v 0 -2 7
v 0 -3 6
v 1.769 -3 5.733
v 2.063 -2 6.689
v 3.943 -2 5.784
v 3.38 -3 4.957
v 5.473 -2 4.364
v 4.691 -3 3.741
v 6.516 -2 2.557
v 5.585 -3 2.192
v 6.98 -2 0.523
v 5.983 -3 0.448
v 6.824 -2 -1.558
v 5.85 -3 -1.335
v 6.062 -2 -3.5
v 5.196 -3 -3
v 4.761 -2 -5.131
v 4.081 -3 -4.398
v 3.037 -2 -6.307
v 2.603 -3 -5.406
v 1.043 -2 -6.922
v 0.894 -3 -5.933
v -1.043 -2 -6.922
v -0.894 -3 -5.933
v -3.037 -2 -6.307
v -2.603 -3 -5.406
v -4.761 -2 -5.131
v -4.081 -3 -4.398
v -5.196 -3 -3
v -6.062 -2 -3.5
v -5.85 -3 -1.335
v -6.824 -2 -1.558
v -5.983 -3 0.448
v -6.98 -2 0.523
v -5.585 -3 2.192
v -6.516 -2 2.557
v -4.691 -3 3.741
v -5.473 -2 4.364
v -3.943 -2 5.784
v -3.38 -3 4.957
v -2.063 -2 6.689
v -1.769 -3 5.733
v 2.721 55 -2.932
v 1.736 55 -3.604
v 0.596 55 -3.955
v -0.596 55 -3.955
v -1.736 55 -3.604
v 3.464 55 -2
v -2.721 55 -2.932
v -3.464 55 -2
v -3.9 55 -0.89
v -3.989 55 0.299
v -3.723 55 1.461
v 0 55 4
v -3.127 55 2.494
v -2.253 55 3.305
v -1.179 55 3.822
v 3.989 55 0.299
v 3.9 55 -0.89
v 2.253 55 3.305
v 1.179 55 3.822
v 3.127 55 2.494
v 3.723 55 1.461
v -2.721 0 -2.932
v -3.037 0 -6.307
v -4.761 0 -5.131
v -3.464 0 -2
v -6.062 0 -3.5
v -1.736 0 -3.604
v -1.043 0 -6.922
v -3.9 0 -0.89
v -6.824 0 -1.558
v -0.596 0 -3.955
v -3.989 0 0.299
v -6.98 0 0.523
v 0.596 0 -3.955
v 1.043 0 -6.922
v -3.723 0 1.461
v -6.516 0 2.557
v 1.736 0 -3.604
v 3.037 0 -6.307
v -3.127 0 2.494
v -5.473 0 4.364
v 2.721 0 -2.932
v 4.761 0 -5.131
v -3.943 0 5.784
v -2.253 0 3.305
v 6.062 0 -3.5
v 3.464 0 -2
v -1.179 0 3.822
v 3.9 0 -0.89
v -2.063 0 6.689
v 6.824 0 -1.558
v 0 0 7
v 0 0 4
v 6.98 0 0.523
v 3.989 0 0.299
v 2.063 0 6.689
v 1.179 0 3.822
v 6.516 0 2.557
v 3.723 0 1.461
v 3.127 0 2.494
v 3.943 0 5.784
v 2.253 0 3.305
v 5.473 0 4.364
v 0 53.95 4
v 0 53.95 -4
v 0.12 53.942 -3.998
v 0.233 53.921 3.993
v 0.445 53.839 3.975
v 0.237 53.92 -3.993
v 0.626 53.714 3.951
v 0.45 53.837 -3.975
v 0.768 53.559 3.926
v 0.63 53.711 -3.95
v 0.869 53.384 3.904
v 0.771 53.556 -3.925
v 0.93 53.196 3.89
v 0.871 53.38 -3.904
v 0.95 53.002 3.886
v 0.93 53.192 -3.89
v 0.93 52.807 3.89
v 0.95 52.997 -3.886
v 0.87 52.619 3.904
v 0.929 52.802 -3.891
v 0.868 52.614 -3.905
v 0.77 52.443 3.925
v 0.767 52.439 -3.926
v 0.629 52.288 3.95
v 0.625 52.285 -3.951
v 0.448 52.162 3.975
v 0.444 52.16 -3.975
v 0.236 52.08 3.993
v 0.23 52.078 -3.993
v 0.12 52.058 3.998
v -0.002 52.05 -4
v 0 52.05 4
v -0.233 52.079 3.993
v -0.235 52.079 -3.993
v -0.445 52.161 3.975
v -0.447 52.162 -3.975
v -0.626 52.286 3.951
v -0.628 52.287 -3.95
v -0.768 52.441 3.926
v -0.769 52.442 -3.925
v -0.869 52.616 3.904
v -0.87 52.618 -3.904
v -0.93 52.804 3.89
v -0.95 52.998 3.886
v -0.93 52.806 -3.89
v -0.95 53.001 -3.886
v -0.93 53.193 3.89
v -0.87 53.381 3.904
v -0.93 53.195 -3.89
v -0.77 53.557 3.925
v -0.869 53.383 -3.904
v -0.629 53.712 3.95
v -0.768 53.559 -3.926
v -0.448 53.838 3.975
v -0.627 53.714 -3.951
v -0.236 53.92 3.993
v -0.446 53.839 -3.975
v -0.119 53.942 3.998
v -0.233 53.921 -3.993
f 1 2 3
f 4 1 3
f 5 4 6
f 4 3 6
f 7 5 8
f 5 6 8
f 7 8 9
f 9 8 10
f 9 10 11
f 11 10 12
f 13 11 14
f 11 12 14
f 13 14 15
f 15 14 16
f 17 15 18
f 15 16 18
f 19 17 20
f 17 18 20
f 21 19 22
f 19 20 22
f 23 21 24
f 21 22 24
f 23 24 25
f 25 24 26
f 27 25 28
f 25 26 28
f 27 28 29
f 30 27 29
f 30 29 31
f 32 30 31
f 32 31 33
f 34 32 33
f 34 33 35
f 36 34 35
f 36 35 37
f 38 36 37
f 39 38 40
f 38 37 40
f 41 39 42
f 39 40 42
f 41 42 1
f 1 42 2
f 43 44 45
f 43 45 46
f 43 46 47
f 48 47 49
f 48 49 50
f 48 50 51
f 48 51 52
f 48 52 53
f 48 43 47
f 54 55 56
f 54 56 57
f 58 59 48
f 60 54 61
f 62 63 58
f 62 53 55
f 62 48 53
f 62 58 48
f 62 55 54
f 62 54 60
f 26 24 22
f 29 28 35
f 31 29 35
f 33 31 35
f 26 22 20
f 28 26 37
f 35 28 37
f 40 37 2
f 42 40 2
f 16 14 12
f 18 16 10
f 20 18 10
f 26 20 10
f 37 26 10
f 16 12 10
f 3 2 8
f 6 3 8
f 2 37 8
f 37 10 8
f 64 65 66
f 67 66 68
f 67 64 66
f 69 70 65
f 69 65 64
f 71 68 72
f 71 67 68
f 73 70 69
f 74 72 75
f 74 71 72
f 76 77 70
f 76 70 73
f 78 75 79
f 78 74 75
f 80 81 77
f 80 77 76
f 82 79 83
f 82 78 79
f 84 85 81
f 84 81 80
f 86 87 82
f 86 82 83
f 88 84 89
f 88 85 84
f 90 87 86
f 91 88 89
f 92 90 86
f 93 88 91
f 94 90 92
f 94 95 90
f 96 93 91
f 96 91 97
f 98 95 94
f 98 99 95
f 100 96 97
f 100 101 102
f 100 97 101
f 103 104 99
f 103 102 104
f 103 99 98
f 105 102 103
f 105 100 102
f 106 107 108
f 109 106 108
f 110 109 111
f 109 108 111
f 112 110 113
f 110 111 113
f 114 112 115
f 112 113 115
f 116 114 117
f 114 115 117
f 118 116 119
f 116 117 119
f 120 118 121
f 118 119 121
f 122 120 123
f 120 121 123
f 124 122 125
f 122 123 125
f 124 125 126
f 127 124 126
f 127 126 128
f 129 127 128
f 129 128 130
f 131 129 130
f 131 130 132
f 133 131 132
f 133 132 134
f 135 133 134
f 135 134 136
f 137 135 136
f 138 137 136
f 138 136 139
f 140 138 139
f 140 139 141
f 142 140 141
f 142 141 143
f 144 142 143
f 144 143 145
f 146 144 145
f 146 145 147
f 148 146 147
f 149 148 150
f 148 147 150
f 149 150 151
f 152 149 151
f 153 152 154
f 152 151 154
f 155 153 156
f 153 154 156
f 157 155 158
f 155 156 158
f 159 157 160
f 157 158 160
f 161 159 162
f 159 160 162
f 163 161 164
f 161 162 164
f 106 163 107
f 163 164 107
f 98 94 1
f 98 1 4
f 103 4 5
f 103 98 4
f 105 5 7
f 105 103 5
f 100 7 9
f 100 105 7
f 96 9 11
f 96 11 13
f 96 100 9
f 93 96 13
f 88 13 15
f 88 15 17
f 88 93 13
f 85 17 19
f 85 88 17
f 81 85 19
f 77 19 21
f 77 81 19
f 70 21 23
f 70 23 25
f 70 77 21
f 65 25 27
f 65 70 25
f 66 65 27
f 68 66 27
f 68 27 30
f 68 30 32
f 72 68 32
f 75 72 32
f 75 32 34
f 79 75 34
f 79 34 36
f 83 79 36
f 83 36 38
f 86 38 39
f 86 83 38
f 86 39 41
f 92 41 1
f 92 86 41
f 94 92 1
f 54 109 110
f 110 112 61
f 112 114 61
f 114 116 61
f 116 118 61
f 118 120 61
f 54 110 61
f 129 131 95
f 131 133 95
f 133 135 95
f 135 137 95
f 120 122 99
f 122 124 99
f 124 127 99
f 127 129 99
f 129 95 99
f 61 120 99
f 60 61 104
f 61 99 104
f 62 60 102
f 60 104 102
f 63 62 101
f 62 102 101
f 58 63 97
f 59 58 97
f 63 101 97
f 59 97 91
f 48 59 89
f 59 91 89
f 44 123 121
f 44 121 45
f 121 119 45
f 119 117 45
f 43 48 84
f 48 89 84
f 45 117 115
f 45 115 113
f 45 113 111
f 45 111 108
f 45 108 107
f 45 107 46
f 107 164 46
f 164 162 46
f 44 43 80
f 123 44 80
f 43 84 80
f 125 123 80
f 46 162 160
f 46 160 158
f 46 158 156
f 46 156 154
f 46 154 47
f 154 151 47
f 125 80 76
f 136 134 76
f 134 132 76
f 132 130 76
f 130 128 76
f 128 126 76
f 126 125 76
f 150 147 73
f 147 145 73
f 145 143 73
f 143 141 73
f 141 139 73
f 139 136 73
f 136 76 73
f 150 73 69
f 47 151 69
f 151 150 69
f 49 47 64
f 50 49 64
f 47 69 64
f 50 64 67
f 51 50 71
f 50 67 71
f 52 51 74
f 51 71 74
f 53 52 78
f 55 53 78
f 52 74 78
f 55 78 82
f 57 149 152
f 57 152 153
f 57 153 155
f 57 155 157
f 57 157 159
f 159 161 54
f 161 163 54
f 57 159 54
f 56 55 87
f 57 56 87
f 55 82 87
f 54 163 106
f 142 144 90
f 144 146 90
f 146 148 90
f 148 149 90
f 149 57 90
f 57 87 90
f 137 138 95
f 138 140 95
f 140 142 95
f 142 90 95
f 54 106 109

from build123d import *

# Parameters (mm, degrees)
SKETCH1_R           = 7
BOSS_EXTRUDE1_DEPTH = 3
SKETCH1_3_R         = 4
BOSS_EXTRUDE2_DEPTH = 55
SKETCH2_R           = 0.95
CUT_EXTRUDE1_DEPTH  = 57.524331044
CHAMFER1_SIZE       = 1


with BuildPart() as part:
    # Sketch1 → Boss-Extrude1 (new body)
    with BuildSketch(Plane(origin=(0, 0, 0), x_dir=(1, 0, 0), z_dir=(0, 1, 0))):
        Circle(SKETCH1_R)
    extrude(amount=-BOSS_EXTRUDE1_DEPTH)

    # Sketch1<3> → Boss-Extrude2 (add)
    with BuildSketch(Plane(origin=(0, 0, 0), x_dir=(1, 0, 0), z_dir=(0, 1, 0))):
        Circle(SKETCH1_3_R)
    extrude(amount=BOSS_EXTRUDE2_DEPTH)

    # Sketch2 → Cut-Extrude1 (cut, through all)
    with BuildSketch(Plane(origin=(0, 0, -4), x_dir=(-1, 0, 0), z_dir=(0, 0, -1))):
        with Locations((0, 53)):
            Circle(SKETCH2_R)
    extrude(amount=-CUT_EXTRUDE1_DEPTH, mode=Mode.SUBTRACT)

    # Chamfer1
    chamfer1_edges = [part.edges().sort_by_distance(p)[0] for p in [
        (-7, -3, 0),
    ]]
    chamfer(chamfer1_edges, length=CHAMFER1_SIZE)


solid = part.part
